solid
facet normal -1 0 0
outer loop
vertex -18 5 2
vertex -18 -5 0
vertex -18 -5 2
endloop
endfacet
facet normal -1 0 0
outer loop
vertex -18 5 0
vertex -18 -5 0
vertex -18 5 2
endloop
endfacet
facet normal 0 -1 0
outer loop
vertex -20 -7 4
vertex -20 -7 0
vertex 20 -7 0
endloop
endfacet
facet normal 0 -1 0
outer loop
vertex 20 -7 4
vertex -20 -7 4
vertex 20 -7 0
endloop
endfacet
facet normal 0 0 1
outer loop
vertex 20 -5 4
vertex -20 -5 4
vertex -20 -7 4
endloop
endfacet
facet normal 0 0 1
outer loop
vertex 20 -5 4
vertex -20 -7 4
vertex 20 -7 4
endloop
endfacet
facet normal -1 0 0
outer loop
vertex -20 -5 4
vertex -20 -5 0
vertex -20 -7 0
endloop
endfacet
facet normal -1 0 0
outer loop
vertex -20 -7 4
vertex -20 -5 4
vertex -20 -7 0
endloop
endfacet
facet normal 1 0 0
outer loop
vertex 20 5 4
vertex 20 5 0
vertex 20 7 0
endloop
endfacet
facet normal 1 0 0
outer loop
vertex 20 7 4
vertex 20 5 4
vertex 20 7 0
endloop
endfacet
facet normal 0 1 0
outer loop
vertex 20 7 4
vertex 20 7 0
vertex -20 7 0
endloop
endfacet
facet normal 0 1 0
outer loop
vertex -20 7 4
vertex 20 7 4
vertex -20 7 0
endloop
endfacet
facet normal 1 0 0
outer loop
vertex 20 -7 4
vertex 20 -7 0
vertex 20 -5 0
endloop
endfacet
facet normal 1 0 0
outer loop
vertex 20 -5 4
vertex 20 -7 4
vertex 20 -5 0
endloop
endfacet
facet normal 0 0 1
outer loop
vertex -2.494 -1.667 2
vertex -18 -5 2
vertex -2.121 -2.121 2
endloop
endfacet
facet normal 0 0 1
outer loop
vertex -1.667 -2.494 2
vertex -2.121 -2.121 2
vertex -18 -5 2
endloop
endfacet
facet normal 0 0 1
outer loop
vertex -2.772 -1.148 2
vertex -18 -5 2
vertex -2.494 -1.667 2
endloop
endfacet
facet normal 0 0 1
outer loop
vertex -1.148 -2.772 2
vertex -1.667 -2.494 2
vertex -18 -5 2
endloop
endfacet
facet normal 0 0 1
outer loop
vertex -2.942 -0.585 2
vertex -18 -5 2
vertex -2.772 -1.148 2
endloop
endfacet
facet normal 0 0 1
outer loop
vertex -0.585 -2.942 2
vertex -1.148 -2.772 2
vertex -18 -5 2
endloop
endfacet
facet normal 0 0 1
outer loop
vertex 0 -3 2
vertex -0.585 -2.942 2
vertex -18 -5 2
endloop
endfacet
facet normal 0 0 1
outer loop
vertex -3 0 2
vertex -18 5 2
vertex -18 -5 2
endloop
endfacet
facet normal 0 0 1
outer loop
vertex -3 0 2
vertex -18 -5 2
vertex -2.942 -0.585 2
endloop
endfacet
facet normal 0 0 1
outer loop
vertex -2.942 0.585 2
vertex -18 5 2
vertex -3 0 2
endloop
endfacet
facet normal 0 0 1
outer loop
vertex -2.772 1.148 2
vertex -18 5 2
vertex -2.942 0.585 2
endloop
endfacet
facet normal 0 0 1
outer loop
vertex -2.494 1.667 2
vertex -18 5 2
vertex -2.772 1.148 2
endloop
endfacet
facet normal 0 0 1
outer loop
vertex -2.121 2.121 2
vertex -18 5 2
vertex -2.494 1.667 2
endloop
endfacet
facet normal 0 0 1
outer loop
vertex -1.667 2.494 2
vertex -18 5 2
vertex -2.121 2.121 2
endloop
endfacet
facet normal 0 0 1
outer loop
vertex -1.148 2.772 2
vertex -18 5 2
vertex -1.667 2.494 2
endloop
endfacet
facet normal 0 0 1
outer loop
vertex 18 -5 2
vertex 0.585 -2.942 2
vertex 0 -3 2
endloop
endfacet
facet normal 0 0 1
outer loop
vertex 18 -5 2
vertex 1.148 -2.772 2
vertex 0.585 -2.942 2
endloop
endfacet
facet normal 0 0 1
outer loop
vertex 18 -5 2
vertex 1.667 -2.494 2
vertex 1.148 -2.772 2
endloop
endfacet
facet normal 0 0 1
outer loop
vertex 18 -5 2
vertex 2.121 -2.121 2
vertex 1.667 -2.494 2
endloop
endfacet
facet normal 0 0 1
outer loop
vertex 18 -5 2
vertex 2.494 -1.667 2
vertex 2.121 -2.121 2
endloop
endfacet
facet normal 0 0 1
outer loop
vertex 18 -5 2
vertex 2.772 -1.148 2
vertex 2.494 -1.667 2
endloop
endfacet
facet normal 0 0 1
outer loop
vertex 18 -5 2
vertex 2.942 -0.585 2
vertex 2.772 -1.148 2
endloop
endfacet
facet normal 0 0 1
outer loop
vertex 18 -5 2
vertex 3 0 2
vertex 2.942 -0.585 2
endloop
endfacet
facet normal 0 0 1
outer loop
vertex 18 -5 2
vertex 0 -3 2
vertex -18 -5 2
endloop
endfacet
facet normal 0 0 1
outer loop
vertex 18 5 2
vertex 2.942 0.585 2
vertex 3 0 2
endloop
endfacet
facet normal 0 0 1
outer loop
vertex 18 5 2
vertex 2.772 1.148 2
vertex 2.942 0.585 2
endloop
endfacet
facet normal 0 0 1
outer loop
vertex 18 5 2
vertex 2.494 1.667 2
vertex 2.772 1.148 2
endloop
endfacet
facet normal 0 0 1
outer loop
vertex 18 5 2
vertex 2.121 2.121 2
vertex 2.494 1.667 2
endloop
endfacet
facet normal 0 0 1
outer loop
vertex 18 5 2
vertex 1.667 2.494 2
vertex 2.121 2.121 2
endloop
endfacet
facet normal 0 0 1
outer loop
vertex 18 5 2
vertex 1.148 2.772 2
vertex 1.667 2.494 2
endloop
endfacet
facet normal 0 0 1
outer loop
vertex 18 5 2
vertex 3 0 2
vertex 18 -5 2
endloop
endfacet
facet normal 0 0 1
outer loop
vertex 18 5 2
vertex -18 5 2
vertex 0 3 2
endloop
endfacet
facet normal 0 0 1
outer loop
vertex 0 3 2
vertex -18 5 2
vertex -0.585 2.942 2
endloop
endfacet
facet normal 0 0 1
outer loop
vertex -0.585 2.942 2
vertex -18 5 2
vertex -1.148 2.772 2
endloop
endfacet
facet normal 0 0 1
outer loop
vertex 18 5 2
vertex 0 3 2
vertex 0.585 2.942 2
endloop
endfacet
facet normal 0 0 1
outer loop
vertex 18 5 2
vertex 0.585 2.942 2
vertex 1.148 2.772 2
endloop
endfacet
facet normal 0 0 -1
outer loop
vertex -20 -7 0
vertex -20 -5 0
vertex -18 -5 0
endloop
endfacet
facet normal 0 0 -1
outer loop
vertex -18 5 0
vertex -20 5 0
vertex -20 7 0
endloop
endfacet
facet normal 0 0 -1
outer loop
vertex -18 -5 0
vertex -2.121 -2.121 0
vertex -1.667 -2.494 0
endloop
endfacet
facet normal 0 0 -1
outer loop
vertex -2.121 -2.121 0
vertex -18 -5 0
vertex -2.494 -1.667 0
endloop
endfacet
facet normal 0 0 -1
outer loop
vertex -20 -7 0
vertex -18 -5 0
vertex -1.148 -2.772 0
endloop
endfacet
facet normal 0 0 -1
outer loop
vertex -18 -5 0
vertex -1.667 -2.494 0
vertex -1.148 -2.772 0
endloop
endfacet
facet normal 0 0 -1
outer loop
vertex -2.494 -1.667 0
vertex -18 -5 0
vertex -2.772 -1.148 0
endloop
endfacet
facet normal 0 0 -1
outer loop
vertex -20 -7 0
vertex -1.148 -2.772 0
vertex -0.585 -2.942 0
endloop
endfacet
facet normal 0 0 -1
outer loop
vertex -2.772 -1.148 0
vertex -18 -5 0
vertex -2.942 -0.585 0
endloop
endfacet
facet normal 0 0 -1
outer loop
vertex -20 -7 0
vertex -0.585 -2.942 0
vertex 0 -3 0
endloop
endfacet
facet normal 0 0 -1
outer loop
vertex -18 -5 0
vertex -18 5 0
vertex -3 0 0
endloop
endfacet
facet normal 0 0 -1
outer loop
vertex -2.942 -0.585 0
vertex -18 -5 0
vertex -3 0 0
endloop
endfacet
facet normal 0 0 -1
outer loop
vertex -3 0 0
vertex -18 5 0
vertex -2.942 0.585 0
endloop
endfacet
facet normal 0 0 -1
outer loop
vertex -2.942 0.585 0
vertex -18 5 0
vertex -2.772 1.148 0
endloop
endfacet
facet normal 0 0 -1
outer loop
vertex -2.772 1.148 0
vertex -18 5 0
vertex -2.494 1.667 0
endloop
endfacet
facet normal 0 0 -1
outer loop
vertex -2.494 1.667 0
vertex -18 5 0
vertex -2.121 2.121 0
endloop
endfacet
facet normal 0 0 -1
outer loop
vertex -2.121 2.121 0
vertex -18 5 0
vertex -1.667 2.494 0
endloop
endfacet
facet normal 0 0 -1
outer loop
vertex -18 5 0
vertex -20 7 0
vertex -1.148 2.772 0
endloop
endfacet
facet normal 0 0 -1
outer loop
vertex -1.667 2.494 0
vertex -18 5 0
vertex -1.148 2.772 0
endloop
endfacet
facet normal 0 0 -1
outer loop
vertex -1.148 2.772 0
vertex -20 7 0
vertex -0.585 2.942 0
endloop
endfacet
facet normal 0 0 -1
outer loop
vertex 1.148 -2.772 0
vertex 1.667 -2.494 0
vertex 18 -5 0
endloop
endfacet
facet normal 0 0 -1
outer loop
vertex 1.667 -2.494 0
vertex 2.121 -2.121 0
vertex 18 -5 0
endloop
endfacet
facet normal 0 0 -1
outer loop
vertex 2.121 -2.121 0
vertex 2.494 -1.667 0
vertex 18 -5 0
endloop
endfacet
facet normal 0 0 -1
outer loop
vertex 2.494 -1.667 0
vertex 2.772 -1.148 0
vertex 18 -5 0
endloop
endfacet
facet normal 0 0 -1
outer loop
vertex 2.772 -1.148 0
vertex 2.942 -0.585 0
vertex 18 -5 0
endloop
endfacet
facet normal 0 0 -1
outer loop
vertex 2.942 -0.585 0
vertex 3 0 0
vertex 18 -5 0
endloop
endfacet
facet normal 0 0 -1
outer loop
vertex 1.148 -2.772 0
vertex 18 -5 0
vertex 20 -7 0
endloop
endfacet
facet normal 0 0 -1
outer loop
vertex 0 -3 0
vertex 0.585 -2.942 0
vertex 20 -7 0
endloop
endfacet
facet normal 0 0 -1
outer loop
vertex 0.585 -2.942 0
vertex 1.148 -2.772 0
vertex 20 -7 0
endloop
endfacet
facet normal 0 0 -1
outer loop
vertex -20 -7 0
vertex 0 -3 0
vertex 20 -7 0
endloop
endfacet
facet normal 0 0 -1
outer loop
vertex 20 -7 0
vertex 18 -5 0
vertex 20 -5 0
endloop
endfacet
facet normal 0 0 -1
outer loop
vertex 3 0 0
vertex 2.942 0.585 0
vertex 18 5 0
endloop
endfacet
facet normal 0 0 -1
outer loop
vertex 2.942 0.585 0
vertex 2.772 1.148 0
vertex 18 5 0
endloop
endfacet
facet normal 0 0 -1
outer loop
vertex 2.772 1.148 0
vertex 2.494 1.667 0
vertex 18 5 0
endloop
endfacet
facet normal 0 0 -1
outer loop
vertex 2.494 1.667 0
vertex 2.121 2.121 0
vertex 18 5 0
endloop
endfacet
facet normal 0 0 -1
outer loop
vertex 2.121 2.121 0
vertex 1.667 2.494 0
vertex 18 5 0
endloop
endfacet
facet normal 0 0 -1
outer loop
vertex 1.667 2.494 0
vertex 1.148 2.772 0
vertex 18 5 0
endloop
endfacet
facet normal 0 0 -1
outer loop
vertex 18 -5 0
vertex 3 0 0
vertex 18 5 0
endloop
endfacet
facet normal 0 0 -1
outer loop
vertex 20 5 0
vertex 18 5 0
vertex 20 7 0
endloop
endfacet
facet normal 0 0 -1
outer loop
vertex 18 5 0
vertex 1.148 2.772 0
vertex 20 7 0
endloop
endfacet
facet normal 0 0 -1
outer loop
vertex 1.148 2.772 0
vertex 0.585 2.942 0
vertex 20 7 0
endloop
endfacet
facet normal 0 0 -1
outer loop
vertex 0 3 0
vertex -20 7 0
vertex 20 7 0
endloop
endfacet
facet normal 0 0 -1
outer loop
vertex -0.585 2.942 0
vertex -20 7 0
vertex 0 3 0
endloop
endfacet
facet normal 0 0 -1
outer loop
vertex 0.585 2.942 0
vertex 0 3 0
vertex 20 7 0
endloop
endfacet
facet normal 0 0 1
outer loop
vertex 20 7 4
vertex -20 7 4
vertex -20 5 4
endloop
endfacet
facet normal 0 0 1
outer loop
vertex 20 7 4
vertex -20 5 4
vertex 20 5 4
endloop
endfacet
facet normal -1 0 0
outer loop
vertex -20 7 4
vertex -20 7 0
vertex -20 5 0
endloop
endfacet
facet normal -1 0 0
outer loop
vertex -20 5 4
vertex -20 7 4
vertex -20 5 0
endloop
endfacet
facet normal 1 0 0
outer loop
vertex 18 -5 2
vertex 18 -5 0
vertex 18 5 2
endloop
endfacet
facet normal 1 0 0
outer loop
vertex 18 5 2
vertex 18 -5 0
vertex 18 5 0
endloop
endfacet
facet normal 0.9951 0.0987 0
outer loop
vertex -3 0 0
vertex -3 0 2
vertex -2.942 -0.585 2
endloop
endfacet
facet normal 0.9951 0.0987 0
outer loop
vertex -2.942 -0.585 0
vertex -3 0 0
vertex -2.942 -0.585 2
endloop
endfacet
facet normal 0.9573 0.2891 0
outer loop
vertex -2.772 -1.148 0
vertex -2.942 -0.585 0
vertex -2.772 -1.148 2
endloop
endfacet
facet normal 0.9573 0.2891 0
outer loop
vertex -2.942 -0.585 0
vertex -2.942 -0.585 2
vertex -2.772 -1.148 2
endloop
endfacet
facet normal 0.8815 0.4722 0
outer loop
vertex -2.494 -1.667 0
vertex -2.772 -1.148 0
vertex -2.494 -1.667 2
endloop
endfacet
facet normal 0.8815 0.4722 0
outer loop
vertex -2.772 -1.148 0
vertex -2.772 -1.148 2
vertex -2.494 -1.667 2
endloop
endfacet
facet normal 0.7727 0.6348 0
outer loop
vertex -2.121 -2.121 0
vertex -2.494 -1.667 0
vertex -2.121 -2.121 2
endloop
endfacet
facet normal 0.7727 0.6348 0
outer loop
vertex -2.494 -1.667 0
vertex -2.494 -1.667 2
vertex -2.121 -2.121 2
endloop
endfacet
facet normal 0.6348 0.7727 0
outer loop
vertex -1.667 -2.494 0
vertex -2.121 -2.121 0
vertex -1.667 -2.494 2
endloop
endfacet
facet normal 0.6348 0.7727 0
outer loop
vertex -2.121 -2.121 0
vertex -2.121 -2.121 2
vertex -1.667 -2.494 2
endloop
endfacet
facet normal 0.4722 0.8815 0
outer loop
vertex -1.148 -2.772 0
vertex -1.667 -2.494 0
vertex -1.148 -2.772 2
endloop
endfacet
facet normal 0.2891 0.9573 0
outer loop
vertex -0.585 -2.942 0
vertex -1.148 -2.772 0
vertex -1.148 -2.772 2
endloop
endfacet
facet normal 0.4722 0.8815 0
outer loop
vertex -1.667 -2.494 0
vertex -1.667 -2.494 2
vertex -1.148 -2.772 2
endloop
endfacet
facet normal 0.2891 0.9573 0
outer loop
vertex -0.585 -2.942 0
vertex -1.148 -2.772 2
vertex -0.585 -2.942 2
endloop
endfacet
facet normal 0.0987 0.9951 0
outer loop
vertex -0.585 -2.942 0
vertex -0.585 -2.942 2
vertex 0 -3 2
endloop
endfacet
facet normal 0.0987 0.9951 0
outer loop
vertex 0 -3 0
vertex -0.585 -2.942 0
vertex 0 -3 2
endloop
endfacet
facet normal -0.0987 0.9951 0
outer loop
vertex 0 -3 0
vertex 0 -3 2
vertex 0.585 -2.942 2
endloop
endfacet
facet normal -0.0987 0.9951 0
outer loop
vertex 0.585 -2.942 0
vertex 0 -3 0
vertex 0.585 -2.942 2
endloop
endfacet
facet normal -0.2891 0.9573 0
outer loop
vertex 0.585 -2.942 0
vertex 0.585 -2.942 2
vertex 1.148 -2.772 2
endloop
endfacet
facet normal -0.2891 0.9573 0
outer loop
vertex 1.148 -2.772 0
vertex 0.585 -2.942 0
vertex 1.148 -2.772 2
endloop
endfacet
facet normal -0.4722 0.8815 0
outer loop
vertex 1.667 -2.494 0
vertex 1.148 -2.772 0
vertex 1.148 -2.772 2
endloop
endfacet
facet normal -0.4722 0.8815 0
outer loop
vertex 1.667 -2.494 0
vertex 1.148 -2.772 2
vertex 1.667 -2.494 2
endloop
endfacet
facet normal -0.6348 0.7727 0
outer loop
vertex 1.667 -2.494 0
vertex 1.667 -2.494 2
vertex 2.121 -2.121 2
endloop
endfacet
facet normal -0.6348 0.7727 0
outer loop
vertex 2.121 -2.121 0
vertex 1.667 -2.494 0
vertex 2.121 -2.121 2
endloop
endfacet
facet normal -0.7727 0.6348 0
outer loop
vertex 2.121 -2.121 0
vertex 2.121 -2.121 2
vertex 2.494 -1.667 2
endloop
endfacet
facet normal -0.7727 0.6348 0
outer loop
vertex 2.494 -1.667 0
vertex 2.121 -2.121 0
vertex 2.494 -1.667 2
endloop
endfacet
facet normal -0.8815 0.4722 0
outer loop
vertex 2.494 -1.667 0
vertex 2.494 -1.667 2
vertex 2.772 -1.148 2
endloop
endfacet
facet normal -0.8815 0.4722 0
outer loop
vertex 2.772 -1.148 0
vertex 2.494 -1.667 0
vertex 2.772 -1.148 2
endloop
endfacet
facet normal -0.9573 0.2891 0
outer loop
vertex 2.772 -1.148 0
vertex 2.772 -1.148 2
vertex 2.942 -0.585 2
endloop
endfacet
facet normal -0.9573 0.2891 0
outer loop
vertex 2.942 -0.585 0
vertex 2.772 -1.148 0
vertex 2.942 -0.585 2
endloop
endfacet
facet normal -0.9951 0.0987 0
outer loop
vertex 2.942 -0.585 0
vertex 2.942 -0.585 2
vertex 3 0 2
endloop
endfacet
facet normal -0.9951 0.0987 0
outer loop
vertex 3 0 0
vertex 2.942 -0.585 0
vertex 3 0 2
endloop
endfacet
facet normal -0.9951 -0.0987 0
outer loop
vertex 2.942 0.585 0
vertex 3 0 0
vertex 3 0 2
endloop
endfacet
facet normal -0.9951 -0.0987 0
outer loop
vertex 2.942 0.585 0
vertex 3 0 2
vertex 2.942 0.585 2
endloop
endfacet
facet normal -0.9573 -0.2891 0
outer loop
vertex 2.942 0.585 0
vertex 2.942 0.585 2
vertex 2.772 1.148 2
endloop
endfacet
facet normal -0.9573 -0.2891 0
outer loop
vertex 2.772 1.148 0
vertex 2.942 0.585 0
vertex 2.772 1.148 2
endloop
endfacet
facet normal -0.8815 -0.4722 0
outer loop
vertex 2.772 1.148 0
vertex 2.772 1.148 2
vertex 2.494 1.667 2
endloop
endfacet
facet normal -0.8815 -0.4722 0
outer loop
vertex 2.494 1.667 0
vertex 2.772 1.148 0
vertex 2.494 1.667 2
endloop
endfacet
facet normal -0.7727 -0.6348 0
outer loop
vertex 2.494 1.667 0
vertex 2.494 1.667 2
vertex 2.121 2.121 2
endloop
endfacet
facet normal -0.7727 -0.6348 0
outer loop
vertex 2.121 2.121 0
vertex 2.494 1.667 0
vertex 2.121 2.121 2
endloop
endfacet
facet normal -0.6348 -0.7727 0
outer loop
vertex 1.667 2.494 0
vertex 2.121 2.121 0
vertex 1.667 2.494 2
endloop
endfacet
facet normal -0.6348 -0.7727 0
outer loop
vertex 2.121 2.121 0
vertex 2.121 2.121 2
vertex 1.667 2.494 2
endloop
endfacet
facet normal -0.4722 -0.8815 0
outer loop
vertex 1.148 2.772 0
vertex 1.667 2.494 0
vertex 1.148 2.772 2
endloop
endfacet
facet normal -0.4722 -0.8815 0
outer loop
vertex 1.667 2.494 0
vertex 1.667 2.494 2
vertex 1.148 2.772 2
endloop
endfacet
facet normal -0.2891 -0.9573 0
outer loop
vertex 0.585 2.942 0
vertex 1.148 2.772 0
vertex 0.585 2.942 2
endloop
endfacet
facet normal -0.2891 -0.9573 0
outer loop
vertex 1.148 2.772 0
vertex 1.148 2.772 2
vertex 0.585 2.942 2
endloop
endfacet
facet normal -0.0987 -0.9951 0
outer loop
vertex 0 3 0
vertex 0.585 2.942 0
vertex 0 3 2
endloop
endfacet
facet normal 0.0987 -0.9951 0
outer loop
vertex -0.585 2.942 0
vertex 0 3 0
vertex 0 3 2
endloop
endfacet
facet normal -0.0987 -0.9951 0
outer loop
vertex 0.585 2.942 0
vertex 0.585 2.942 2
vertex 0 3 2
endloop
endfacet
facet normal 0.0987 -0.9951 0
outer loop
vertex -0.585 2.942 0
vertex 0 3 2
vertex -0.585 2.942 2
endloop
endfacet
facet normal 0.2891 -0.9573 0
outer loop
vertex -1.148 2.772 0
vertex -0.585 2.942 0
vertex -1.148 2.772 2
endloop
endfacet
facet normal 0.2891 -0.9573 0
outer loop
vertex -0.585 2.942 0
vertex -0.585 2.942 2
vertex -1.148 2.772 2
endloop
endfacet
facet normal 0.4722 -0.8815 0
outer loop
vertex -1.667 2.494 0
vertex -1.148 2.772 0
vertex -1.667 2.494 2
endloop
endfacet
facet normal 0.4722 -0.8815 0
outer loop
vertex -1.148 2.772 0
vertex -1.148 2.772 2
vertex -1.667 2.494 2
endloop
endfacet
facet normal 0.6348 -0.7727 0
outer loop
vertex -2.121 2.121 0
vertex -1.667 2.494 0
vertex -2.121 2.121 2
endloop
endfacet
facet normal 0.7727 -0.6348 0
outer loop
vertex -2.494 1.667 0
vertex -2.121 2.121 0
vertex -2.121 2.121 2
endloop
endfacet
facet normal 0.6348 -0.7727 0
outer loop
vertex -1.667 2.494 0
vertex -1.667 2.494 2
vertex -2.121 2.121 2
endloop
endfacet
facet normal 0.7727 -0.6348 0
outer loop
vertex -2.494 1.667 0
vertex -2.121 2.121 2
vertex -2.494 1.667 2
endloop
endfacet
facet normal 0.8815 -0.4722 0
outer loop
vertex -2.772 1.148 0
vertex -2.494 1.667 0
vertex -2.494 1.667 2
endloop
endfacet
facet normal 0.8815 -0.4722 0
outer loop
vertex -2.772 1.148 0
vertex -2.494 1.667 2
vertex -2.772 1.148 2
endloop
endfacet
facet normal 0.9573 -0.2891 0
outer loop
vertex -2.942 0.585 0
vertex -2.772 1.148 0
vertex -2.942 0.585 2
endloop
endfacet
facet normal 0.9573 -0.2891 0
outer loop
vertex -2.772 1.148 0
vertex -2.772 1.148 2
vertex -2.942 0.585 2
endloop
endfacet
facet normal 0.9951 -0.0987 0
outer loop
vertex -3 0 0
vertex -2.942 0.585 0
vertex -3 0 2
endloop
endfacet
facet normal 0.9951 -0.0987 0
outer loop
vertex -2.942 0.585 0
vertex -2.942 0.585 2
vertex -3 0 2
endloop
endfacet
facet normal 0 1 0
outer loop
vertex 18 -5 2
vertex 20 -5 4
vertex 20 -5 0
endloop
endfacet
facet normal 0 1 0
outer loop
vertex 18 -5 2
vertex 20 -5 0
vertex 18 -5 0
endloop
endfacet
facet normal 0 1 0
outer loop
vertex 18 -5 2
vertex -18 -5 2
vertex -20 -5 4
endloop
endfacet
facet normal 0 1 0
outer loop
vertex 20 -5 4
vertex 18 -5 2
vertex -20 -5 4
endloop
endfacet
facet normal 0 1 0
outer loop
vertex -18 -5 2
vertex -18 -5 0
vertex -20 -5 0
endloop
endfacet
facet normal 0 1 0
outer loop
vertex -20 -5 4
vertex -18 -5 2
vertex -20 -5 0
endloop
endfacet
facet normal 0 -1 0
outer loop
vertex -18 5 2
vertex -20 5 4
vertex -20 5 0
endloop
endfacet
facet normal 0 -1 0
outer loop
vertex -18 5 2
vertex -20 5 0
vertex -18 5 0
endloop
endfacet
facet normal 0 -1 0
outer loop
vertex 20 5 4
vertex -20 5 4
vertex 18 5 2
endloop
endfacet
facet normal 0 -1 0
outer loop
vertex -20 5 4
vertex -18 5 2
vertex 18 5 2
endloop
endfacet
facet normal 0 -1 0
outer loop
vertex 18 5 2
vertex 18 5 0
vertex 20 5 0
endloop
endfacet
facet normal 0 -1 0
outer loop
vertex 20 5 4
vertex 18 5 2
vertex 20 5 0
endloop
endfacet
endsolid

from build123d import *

# Parameters (mm, degrees)
F0_W     = 36
F0_H     = 10
F1_DEPTH = 2
F2_DEPTH = 4
F4_D     = 6
F4_DEPTH = 2


with BuildPart() as f1:
    # F0 (on Top) → F1 (new body)
    with BuildSketch(Plane.XY):
        Rectangle(F0_W, F0_H)
        Polygon((20, 7), (-20, 7), (-20, 5), (-18, 5), (18, 5), (20, 5), align=None)
        Polygon((-18, -5), (-20, -5), (-20, -7), (20, -7), (20, -5), (18, -5), align=None)
    extrude(amount=F1_DEPTH)

    # F0 (on Top) → F2 (join)
    with BuildSketch(Plane.XY):
        Polygon((20, 7), (-20, 7), (-20, 5), (-18, 5), (18, 5), (20, 5), align=None)
        Polygon((-18, -5), (-20, -5), (-20, -7), (20, -7), (20, -5), (18, -5), align=None)
    extrude(amount=F2_DEPTH)

    # F4
    with Locations(Plane(origin=(0, 0, 0), x_dir=(1, 0, 0), z_dir=(0, 0, -1))):
        with Locations((0, 0)):
            Hole(F4_D / 2, depth=F4_DEPTH)


solid = f1.part
